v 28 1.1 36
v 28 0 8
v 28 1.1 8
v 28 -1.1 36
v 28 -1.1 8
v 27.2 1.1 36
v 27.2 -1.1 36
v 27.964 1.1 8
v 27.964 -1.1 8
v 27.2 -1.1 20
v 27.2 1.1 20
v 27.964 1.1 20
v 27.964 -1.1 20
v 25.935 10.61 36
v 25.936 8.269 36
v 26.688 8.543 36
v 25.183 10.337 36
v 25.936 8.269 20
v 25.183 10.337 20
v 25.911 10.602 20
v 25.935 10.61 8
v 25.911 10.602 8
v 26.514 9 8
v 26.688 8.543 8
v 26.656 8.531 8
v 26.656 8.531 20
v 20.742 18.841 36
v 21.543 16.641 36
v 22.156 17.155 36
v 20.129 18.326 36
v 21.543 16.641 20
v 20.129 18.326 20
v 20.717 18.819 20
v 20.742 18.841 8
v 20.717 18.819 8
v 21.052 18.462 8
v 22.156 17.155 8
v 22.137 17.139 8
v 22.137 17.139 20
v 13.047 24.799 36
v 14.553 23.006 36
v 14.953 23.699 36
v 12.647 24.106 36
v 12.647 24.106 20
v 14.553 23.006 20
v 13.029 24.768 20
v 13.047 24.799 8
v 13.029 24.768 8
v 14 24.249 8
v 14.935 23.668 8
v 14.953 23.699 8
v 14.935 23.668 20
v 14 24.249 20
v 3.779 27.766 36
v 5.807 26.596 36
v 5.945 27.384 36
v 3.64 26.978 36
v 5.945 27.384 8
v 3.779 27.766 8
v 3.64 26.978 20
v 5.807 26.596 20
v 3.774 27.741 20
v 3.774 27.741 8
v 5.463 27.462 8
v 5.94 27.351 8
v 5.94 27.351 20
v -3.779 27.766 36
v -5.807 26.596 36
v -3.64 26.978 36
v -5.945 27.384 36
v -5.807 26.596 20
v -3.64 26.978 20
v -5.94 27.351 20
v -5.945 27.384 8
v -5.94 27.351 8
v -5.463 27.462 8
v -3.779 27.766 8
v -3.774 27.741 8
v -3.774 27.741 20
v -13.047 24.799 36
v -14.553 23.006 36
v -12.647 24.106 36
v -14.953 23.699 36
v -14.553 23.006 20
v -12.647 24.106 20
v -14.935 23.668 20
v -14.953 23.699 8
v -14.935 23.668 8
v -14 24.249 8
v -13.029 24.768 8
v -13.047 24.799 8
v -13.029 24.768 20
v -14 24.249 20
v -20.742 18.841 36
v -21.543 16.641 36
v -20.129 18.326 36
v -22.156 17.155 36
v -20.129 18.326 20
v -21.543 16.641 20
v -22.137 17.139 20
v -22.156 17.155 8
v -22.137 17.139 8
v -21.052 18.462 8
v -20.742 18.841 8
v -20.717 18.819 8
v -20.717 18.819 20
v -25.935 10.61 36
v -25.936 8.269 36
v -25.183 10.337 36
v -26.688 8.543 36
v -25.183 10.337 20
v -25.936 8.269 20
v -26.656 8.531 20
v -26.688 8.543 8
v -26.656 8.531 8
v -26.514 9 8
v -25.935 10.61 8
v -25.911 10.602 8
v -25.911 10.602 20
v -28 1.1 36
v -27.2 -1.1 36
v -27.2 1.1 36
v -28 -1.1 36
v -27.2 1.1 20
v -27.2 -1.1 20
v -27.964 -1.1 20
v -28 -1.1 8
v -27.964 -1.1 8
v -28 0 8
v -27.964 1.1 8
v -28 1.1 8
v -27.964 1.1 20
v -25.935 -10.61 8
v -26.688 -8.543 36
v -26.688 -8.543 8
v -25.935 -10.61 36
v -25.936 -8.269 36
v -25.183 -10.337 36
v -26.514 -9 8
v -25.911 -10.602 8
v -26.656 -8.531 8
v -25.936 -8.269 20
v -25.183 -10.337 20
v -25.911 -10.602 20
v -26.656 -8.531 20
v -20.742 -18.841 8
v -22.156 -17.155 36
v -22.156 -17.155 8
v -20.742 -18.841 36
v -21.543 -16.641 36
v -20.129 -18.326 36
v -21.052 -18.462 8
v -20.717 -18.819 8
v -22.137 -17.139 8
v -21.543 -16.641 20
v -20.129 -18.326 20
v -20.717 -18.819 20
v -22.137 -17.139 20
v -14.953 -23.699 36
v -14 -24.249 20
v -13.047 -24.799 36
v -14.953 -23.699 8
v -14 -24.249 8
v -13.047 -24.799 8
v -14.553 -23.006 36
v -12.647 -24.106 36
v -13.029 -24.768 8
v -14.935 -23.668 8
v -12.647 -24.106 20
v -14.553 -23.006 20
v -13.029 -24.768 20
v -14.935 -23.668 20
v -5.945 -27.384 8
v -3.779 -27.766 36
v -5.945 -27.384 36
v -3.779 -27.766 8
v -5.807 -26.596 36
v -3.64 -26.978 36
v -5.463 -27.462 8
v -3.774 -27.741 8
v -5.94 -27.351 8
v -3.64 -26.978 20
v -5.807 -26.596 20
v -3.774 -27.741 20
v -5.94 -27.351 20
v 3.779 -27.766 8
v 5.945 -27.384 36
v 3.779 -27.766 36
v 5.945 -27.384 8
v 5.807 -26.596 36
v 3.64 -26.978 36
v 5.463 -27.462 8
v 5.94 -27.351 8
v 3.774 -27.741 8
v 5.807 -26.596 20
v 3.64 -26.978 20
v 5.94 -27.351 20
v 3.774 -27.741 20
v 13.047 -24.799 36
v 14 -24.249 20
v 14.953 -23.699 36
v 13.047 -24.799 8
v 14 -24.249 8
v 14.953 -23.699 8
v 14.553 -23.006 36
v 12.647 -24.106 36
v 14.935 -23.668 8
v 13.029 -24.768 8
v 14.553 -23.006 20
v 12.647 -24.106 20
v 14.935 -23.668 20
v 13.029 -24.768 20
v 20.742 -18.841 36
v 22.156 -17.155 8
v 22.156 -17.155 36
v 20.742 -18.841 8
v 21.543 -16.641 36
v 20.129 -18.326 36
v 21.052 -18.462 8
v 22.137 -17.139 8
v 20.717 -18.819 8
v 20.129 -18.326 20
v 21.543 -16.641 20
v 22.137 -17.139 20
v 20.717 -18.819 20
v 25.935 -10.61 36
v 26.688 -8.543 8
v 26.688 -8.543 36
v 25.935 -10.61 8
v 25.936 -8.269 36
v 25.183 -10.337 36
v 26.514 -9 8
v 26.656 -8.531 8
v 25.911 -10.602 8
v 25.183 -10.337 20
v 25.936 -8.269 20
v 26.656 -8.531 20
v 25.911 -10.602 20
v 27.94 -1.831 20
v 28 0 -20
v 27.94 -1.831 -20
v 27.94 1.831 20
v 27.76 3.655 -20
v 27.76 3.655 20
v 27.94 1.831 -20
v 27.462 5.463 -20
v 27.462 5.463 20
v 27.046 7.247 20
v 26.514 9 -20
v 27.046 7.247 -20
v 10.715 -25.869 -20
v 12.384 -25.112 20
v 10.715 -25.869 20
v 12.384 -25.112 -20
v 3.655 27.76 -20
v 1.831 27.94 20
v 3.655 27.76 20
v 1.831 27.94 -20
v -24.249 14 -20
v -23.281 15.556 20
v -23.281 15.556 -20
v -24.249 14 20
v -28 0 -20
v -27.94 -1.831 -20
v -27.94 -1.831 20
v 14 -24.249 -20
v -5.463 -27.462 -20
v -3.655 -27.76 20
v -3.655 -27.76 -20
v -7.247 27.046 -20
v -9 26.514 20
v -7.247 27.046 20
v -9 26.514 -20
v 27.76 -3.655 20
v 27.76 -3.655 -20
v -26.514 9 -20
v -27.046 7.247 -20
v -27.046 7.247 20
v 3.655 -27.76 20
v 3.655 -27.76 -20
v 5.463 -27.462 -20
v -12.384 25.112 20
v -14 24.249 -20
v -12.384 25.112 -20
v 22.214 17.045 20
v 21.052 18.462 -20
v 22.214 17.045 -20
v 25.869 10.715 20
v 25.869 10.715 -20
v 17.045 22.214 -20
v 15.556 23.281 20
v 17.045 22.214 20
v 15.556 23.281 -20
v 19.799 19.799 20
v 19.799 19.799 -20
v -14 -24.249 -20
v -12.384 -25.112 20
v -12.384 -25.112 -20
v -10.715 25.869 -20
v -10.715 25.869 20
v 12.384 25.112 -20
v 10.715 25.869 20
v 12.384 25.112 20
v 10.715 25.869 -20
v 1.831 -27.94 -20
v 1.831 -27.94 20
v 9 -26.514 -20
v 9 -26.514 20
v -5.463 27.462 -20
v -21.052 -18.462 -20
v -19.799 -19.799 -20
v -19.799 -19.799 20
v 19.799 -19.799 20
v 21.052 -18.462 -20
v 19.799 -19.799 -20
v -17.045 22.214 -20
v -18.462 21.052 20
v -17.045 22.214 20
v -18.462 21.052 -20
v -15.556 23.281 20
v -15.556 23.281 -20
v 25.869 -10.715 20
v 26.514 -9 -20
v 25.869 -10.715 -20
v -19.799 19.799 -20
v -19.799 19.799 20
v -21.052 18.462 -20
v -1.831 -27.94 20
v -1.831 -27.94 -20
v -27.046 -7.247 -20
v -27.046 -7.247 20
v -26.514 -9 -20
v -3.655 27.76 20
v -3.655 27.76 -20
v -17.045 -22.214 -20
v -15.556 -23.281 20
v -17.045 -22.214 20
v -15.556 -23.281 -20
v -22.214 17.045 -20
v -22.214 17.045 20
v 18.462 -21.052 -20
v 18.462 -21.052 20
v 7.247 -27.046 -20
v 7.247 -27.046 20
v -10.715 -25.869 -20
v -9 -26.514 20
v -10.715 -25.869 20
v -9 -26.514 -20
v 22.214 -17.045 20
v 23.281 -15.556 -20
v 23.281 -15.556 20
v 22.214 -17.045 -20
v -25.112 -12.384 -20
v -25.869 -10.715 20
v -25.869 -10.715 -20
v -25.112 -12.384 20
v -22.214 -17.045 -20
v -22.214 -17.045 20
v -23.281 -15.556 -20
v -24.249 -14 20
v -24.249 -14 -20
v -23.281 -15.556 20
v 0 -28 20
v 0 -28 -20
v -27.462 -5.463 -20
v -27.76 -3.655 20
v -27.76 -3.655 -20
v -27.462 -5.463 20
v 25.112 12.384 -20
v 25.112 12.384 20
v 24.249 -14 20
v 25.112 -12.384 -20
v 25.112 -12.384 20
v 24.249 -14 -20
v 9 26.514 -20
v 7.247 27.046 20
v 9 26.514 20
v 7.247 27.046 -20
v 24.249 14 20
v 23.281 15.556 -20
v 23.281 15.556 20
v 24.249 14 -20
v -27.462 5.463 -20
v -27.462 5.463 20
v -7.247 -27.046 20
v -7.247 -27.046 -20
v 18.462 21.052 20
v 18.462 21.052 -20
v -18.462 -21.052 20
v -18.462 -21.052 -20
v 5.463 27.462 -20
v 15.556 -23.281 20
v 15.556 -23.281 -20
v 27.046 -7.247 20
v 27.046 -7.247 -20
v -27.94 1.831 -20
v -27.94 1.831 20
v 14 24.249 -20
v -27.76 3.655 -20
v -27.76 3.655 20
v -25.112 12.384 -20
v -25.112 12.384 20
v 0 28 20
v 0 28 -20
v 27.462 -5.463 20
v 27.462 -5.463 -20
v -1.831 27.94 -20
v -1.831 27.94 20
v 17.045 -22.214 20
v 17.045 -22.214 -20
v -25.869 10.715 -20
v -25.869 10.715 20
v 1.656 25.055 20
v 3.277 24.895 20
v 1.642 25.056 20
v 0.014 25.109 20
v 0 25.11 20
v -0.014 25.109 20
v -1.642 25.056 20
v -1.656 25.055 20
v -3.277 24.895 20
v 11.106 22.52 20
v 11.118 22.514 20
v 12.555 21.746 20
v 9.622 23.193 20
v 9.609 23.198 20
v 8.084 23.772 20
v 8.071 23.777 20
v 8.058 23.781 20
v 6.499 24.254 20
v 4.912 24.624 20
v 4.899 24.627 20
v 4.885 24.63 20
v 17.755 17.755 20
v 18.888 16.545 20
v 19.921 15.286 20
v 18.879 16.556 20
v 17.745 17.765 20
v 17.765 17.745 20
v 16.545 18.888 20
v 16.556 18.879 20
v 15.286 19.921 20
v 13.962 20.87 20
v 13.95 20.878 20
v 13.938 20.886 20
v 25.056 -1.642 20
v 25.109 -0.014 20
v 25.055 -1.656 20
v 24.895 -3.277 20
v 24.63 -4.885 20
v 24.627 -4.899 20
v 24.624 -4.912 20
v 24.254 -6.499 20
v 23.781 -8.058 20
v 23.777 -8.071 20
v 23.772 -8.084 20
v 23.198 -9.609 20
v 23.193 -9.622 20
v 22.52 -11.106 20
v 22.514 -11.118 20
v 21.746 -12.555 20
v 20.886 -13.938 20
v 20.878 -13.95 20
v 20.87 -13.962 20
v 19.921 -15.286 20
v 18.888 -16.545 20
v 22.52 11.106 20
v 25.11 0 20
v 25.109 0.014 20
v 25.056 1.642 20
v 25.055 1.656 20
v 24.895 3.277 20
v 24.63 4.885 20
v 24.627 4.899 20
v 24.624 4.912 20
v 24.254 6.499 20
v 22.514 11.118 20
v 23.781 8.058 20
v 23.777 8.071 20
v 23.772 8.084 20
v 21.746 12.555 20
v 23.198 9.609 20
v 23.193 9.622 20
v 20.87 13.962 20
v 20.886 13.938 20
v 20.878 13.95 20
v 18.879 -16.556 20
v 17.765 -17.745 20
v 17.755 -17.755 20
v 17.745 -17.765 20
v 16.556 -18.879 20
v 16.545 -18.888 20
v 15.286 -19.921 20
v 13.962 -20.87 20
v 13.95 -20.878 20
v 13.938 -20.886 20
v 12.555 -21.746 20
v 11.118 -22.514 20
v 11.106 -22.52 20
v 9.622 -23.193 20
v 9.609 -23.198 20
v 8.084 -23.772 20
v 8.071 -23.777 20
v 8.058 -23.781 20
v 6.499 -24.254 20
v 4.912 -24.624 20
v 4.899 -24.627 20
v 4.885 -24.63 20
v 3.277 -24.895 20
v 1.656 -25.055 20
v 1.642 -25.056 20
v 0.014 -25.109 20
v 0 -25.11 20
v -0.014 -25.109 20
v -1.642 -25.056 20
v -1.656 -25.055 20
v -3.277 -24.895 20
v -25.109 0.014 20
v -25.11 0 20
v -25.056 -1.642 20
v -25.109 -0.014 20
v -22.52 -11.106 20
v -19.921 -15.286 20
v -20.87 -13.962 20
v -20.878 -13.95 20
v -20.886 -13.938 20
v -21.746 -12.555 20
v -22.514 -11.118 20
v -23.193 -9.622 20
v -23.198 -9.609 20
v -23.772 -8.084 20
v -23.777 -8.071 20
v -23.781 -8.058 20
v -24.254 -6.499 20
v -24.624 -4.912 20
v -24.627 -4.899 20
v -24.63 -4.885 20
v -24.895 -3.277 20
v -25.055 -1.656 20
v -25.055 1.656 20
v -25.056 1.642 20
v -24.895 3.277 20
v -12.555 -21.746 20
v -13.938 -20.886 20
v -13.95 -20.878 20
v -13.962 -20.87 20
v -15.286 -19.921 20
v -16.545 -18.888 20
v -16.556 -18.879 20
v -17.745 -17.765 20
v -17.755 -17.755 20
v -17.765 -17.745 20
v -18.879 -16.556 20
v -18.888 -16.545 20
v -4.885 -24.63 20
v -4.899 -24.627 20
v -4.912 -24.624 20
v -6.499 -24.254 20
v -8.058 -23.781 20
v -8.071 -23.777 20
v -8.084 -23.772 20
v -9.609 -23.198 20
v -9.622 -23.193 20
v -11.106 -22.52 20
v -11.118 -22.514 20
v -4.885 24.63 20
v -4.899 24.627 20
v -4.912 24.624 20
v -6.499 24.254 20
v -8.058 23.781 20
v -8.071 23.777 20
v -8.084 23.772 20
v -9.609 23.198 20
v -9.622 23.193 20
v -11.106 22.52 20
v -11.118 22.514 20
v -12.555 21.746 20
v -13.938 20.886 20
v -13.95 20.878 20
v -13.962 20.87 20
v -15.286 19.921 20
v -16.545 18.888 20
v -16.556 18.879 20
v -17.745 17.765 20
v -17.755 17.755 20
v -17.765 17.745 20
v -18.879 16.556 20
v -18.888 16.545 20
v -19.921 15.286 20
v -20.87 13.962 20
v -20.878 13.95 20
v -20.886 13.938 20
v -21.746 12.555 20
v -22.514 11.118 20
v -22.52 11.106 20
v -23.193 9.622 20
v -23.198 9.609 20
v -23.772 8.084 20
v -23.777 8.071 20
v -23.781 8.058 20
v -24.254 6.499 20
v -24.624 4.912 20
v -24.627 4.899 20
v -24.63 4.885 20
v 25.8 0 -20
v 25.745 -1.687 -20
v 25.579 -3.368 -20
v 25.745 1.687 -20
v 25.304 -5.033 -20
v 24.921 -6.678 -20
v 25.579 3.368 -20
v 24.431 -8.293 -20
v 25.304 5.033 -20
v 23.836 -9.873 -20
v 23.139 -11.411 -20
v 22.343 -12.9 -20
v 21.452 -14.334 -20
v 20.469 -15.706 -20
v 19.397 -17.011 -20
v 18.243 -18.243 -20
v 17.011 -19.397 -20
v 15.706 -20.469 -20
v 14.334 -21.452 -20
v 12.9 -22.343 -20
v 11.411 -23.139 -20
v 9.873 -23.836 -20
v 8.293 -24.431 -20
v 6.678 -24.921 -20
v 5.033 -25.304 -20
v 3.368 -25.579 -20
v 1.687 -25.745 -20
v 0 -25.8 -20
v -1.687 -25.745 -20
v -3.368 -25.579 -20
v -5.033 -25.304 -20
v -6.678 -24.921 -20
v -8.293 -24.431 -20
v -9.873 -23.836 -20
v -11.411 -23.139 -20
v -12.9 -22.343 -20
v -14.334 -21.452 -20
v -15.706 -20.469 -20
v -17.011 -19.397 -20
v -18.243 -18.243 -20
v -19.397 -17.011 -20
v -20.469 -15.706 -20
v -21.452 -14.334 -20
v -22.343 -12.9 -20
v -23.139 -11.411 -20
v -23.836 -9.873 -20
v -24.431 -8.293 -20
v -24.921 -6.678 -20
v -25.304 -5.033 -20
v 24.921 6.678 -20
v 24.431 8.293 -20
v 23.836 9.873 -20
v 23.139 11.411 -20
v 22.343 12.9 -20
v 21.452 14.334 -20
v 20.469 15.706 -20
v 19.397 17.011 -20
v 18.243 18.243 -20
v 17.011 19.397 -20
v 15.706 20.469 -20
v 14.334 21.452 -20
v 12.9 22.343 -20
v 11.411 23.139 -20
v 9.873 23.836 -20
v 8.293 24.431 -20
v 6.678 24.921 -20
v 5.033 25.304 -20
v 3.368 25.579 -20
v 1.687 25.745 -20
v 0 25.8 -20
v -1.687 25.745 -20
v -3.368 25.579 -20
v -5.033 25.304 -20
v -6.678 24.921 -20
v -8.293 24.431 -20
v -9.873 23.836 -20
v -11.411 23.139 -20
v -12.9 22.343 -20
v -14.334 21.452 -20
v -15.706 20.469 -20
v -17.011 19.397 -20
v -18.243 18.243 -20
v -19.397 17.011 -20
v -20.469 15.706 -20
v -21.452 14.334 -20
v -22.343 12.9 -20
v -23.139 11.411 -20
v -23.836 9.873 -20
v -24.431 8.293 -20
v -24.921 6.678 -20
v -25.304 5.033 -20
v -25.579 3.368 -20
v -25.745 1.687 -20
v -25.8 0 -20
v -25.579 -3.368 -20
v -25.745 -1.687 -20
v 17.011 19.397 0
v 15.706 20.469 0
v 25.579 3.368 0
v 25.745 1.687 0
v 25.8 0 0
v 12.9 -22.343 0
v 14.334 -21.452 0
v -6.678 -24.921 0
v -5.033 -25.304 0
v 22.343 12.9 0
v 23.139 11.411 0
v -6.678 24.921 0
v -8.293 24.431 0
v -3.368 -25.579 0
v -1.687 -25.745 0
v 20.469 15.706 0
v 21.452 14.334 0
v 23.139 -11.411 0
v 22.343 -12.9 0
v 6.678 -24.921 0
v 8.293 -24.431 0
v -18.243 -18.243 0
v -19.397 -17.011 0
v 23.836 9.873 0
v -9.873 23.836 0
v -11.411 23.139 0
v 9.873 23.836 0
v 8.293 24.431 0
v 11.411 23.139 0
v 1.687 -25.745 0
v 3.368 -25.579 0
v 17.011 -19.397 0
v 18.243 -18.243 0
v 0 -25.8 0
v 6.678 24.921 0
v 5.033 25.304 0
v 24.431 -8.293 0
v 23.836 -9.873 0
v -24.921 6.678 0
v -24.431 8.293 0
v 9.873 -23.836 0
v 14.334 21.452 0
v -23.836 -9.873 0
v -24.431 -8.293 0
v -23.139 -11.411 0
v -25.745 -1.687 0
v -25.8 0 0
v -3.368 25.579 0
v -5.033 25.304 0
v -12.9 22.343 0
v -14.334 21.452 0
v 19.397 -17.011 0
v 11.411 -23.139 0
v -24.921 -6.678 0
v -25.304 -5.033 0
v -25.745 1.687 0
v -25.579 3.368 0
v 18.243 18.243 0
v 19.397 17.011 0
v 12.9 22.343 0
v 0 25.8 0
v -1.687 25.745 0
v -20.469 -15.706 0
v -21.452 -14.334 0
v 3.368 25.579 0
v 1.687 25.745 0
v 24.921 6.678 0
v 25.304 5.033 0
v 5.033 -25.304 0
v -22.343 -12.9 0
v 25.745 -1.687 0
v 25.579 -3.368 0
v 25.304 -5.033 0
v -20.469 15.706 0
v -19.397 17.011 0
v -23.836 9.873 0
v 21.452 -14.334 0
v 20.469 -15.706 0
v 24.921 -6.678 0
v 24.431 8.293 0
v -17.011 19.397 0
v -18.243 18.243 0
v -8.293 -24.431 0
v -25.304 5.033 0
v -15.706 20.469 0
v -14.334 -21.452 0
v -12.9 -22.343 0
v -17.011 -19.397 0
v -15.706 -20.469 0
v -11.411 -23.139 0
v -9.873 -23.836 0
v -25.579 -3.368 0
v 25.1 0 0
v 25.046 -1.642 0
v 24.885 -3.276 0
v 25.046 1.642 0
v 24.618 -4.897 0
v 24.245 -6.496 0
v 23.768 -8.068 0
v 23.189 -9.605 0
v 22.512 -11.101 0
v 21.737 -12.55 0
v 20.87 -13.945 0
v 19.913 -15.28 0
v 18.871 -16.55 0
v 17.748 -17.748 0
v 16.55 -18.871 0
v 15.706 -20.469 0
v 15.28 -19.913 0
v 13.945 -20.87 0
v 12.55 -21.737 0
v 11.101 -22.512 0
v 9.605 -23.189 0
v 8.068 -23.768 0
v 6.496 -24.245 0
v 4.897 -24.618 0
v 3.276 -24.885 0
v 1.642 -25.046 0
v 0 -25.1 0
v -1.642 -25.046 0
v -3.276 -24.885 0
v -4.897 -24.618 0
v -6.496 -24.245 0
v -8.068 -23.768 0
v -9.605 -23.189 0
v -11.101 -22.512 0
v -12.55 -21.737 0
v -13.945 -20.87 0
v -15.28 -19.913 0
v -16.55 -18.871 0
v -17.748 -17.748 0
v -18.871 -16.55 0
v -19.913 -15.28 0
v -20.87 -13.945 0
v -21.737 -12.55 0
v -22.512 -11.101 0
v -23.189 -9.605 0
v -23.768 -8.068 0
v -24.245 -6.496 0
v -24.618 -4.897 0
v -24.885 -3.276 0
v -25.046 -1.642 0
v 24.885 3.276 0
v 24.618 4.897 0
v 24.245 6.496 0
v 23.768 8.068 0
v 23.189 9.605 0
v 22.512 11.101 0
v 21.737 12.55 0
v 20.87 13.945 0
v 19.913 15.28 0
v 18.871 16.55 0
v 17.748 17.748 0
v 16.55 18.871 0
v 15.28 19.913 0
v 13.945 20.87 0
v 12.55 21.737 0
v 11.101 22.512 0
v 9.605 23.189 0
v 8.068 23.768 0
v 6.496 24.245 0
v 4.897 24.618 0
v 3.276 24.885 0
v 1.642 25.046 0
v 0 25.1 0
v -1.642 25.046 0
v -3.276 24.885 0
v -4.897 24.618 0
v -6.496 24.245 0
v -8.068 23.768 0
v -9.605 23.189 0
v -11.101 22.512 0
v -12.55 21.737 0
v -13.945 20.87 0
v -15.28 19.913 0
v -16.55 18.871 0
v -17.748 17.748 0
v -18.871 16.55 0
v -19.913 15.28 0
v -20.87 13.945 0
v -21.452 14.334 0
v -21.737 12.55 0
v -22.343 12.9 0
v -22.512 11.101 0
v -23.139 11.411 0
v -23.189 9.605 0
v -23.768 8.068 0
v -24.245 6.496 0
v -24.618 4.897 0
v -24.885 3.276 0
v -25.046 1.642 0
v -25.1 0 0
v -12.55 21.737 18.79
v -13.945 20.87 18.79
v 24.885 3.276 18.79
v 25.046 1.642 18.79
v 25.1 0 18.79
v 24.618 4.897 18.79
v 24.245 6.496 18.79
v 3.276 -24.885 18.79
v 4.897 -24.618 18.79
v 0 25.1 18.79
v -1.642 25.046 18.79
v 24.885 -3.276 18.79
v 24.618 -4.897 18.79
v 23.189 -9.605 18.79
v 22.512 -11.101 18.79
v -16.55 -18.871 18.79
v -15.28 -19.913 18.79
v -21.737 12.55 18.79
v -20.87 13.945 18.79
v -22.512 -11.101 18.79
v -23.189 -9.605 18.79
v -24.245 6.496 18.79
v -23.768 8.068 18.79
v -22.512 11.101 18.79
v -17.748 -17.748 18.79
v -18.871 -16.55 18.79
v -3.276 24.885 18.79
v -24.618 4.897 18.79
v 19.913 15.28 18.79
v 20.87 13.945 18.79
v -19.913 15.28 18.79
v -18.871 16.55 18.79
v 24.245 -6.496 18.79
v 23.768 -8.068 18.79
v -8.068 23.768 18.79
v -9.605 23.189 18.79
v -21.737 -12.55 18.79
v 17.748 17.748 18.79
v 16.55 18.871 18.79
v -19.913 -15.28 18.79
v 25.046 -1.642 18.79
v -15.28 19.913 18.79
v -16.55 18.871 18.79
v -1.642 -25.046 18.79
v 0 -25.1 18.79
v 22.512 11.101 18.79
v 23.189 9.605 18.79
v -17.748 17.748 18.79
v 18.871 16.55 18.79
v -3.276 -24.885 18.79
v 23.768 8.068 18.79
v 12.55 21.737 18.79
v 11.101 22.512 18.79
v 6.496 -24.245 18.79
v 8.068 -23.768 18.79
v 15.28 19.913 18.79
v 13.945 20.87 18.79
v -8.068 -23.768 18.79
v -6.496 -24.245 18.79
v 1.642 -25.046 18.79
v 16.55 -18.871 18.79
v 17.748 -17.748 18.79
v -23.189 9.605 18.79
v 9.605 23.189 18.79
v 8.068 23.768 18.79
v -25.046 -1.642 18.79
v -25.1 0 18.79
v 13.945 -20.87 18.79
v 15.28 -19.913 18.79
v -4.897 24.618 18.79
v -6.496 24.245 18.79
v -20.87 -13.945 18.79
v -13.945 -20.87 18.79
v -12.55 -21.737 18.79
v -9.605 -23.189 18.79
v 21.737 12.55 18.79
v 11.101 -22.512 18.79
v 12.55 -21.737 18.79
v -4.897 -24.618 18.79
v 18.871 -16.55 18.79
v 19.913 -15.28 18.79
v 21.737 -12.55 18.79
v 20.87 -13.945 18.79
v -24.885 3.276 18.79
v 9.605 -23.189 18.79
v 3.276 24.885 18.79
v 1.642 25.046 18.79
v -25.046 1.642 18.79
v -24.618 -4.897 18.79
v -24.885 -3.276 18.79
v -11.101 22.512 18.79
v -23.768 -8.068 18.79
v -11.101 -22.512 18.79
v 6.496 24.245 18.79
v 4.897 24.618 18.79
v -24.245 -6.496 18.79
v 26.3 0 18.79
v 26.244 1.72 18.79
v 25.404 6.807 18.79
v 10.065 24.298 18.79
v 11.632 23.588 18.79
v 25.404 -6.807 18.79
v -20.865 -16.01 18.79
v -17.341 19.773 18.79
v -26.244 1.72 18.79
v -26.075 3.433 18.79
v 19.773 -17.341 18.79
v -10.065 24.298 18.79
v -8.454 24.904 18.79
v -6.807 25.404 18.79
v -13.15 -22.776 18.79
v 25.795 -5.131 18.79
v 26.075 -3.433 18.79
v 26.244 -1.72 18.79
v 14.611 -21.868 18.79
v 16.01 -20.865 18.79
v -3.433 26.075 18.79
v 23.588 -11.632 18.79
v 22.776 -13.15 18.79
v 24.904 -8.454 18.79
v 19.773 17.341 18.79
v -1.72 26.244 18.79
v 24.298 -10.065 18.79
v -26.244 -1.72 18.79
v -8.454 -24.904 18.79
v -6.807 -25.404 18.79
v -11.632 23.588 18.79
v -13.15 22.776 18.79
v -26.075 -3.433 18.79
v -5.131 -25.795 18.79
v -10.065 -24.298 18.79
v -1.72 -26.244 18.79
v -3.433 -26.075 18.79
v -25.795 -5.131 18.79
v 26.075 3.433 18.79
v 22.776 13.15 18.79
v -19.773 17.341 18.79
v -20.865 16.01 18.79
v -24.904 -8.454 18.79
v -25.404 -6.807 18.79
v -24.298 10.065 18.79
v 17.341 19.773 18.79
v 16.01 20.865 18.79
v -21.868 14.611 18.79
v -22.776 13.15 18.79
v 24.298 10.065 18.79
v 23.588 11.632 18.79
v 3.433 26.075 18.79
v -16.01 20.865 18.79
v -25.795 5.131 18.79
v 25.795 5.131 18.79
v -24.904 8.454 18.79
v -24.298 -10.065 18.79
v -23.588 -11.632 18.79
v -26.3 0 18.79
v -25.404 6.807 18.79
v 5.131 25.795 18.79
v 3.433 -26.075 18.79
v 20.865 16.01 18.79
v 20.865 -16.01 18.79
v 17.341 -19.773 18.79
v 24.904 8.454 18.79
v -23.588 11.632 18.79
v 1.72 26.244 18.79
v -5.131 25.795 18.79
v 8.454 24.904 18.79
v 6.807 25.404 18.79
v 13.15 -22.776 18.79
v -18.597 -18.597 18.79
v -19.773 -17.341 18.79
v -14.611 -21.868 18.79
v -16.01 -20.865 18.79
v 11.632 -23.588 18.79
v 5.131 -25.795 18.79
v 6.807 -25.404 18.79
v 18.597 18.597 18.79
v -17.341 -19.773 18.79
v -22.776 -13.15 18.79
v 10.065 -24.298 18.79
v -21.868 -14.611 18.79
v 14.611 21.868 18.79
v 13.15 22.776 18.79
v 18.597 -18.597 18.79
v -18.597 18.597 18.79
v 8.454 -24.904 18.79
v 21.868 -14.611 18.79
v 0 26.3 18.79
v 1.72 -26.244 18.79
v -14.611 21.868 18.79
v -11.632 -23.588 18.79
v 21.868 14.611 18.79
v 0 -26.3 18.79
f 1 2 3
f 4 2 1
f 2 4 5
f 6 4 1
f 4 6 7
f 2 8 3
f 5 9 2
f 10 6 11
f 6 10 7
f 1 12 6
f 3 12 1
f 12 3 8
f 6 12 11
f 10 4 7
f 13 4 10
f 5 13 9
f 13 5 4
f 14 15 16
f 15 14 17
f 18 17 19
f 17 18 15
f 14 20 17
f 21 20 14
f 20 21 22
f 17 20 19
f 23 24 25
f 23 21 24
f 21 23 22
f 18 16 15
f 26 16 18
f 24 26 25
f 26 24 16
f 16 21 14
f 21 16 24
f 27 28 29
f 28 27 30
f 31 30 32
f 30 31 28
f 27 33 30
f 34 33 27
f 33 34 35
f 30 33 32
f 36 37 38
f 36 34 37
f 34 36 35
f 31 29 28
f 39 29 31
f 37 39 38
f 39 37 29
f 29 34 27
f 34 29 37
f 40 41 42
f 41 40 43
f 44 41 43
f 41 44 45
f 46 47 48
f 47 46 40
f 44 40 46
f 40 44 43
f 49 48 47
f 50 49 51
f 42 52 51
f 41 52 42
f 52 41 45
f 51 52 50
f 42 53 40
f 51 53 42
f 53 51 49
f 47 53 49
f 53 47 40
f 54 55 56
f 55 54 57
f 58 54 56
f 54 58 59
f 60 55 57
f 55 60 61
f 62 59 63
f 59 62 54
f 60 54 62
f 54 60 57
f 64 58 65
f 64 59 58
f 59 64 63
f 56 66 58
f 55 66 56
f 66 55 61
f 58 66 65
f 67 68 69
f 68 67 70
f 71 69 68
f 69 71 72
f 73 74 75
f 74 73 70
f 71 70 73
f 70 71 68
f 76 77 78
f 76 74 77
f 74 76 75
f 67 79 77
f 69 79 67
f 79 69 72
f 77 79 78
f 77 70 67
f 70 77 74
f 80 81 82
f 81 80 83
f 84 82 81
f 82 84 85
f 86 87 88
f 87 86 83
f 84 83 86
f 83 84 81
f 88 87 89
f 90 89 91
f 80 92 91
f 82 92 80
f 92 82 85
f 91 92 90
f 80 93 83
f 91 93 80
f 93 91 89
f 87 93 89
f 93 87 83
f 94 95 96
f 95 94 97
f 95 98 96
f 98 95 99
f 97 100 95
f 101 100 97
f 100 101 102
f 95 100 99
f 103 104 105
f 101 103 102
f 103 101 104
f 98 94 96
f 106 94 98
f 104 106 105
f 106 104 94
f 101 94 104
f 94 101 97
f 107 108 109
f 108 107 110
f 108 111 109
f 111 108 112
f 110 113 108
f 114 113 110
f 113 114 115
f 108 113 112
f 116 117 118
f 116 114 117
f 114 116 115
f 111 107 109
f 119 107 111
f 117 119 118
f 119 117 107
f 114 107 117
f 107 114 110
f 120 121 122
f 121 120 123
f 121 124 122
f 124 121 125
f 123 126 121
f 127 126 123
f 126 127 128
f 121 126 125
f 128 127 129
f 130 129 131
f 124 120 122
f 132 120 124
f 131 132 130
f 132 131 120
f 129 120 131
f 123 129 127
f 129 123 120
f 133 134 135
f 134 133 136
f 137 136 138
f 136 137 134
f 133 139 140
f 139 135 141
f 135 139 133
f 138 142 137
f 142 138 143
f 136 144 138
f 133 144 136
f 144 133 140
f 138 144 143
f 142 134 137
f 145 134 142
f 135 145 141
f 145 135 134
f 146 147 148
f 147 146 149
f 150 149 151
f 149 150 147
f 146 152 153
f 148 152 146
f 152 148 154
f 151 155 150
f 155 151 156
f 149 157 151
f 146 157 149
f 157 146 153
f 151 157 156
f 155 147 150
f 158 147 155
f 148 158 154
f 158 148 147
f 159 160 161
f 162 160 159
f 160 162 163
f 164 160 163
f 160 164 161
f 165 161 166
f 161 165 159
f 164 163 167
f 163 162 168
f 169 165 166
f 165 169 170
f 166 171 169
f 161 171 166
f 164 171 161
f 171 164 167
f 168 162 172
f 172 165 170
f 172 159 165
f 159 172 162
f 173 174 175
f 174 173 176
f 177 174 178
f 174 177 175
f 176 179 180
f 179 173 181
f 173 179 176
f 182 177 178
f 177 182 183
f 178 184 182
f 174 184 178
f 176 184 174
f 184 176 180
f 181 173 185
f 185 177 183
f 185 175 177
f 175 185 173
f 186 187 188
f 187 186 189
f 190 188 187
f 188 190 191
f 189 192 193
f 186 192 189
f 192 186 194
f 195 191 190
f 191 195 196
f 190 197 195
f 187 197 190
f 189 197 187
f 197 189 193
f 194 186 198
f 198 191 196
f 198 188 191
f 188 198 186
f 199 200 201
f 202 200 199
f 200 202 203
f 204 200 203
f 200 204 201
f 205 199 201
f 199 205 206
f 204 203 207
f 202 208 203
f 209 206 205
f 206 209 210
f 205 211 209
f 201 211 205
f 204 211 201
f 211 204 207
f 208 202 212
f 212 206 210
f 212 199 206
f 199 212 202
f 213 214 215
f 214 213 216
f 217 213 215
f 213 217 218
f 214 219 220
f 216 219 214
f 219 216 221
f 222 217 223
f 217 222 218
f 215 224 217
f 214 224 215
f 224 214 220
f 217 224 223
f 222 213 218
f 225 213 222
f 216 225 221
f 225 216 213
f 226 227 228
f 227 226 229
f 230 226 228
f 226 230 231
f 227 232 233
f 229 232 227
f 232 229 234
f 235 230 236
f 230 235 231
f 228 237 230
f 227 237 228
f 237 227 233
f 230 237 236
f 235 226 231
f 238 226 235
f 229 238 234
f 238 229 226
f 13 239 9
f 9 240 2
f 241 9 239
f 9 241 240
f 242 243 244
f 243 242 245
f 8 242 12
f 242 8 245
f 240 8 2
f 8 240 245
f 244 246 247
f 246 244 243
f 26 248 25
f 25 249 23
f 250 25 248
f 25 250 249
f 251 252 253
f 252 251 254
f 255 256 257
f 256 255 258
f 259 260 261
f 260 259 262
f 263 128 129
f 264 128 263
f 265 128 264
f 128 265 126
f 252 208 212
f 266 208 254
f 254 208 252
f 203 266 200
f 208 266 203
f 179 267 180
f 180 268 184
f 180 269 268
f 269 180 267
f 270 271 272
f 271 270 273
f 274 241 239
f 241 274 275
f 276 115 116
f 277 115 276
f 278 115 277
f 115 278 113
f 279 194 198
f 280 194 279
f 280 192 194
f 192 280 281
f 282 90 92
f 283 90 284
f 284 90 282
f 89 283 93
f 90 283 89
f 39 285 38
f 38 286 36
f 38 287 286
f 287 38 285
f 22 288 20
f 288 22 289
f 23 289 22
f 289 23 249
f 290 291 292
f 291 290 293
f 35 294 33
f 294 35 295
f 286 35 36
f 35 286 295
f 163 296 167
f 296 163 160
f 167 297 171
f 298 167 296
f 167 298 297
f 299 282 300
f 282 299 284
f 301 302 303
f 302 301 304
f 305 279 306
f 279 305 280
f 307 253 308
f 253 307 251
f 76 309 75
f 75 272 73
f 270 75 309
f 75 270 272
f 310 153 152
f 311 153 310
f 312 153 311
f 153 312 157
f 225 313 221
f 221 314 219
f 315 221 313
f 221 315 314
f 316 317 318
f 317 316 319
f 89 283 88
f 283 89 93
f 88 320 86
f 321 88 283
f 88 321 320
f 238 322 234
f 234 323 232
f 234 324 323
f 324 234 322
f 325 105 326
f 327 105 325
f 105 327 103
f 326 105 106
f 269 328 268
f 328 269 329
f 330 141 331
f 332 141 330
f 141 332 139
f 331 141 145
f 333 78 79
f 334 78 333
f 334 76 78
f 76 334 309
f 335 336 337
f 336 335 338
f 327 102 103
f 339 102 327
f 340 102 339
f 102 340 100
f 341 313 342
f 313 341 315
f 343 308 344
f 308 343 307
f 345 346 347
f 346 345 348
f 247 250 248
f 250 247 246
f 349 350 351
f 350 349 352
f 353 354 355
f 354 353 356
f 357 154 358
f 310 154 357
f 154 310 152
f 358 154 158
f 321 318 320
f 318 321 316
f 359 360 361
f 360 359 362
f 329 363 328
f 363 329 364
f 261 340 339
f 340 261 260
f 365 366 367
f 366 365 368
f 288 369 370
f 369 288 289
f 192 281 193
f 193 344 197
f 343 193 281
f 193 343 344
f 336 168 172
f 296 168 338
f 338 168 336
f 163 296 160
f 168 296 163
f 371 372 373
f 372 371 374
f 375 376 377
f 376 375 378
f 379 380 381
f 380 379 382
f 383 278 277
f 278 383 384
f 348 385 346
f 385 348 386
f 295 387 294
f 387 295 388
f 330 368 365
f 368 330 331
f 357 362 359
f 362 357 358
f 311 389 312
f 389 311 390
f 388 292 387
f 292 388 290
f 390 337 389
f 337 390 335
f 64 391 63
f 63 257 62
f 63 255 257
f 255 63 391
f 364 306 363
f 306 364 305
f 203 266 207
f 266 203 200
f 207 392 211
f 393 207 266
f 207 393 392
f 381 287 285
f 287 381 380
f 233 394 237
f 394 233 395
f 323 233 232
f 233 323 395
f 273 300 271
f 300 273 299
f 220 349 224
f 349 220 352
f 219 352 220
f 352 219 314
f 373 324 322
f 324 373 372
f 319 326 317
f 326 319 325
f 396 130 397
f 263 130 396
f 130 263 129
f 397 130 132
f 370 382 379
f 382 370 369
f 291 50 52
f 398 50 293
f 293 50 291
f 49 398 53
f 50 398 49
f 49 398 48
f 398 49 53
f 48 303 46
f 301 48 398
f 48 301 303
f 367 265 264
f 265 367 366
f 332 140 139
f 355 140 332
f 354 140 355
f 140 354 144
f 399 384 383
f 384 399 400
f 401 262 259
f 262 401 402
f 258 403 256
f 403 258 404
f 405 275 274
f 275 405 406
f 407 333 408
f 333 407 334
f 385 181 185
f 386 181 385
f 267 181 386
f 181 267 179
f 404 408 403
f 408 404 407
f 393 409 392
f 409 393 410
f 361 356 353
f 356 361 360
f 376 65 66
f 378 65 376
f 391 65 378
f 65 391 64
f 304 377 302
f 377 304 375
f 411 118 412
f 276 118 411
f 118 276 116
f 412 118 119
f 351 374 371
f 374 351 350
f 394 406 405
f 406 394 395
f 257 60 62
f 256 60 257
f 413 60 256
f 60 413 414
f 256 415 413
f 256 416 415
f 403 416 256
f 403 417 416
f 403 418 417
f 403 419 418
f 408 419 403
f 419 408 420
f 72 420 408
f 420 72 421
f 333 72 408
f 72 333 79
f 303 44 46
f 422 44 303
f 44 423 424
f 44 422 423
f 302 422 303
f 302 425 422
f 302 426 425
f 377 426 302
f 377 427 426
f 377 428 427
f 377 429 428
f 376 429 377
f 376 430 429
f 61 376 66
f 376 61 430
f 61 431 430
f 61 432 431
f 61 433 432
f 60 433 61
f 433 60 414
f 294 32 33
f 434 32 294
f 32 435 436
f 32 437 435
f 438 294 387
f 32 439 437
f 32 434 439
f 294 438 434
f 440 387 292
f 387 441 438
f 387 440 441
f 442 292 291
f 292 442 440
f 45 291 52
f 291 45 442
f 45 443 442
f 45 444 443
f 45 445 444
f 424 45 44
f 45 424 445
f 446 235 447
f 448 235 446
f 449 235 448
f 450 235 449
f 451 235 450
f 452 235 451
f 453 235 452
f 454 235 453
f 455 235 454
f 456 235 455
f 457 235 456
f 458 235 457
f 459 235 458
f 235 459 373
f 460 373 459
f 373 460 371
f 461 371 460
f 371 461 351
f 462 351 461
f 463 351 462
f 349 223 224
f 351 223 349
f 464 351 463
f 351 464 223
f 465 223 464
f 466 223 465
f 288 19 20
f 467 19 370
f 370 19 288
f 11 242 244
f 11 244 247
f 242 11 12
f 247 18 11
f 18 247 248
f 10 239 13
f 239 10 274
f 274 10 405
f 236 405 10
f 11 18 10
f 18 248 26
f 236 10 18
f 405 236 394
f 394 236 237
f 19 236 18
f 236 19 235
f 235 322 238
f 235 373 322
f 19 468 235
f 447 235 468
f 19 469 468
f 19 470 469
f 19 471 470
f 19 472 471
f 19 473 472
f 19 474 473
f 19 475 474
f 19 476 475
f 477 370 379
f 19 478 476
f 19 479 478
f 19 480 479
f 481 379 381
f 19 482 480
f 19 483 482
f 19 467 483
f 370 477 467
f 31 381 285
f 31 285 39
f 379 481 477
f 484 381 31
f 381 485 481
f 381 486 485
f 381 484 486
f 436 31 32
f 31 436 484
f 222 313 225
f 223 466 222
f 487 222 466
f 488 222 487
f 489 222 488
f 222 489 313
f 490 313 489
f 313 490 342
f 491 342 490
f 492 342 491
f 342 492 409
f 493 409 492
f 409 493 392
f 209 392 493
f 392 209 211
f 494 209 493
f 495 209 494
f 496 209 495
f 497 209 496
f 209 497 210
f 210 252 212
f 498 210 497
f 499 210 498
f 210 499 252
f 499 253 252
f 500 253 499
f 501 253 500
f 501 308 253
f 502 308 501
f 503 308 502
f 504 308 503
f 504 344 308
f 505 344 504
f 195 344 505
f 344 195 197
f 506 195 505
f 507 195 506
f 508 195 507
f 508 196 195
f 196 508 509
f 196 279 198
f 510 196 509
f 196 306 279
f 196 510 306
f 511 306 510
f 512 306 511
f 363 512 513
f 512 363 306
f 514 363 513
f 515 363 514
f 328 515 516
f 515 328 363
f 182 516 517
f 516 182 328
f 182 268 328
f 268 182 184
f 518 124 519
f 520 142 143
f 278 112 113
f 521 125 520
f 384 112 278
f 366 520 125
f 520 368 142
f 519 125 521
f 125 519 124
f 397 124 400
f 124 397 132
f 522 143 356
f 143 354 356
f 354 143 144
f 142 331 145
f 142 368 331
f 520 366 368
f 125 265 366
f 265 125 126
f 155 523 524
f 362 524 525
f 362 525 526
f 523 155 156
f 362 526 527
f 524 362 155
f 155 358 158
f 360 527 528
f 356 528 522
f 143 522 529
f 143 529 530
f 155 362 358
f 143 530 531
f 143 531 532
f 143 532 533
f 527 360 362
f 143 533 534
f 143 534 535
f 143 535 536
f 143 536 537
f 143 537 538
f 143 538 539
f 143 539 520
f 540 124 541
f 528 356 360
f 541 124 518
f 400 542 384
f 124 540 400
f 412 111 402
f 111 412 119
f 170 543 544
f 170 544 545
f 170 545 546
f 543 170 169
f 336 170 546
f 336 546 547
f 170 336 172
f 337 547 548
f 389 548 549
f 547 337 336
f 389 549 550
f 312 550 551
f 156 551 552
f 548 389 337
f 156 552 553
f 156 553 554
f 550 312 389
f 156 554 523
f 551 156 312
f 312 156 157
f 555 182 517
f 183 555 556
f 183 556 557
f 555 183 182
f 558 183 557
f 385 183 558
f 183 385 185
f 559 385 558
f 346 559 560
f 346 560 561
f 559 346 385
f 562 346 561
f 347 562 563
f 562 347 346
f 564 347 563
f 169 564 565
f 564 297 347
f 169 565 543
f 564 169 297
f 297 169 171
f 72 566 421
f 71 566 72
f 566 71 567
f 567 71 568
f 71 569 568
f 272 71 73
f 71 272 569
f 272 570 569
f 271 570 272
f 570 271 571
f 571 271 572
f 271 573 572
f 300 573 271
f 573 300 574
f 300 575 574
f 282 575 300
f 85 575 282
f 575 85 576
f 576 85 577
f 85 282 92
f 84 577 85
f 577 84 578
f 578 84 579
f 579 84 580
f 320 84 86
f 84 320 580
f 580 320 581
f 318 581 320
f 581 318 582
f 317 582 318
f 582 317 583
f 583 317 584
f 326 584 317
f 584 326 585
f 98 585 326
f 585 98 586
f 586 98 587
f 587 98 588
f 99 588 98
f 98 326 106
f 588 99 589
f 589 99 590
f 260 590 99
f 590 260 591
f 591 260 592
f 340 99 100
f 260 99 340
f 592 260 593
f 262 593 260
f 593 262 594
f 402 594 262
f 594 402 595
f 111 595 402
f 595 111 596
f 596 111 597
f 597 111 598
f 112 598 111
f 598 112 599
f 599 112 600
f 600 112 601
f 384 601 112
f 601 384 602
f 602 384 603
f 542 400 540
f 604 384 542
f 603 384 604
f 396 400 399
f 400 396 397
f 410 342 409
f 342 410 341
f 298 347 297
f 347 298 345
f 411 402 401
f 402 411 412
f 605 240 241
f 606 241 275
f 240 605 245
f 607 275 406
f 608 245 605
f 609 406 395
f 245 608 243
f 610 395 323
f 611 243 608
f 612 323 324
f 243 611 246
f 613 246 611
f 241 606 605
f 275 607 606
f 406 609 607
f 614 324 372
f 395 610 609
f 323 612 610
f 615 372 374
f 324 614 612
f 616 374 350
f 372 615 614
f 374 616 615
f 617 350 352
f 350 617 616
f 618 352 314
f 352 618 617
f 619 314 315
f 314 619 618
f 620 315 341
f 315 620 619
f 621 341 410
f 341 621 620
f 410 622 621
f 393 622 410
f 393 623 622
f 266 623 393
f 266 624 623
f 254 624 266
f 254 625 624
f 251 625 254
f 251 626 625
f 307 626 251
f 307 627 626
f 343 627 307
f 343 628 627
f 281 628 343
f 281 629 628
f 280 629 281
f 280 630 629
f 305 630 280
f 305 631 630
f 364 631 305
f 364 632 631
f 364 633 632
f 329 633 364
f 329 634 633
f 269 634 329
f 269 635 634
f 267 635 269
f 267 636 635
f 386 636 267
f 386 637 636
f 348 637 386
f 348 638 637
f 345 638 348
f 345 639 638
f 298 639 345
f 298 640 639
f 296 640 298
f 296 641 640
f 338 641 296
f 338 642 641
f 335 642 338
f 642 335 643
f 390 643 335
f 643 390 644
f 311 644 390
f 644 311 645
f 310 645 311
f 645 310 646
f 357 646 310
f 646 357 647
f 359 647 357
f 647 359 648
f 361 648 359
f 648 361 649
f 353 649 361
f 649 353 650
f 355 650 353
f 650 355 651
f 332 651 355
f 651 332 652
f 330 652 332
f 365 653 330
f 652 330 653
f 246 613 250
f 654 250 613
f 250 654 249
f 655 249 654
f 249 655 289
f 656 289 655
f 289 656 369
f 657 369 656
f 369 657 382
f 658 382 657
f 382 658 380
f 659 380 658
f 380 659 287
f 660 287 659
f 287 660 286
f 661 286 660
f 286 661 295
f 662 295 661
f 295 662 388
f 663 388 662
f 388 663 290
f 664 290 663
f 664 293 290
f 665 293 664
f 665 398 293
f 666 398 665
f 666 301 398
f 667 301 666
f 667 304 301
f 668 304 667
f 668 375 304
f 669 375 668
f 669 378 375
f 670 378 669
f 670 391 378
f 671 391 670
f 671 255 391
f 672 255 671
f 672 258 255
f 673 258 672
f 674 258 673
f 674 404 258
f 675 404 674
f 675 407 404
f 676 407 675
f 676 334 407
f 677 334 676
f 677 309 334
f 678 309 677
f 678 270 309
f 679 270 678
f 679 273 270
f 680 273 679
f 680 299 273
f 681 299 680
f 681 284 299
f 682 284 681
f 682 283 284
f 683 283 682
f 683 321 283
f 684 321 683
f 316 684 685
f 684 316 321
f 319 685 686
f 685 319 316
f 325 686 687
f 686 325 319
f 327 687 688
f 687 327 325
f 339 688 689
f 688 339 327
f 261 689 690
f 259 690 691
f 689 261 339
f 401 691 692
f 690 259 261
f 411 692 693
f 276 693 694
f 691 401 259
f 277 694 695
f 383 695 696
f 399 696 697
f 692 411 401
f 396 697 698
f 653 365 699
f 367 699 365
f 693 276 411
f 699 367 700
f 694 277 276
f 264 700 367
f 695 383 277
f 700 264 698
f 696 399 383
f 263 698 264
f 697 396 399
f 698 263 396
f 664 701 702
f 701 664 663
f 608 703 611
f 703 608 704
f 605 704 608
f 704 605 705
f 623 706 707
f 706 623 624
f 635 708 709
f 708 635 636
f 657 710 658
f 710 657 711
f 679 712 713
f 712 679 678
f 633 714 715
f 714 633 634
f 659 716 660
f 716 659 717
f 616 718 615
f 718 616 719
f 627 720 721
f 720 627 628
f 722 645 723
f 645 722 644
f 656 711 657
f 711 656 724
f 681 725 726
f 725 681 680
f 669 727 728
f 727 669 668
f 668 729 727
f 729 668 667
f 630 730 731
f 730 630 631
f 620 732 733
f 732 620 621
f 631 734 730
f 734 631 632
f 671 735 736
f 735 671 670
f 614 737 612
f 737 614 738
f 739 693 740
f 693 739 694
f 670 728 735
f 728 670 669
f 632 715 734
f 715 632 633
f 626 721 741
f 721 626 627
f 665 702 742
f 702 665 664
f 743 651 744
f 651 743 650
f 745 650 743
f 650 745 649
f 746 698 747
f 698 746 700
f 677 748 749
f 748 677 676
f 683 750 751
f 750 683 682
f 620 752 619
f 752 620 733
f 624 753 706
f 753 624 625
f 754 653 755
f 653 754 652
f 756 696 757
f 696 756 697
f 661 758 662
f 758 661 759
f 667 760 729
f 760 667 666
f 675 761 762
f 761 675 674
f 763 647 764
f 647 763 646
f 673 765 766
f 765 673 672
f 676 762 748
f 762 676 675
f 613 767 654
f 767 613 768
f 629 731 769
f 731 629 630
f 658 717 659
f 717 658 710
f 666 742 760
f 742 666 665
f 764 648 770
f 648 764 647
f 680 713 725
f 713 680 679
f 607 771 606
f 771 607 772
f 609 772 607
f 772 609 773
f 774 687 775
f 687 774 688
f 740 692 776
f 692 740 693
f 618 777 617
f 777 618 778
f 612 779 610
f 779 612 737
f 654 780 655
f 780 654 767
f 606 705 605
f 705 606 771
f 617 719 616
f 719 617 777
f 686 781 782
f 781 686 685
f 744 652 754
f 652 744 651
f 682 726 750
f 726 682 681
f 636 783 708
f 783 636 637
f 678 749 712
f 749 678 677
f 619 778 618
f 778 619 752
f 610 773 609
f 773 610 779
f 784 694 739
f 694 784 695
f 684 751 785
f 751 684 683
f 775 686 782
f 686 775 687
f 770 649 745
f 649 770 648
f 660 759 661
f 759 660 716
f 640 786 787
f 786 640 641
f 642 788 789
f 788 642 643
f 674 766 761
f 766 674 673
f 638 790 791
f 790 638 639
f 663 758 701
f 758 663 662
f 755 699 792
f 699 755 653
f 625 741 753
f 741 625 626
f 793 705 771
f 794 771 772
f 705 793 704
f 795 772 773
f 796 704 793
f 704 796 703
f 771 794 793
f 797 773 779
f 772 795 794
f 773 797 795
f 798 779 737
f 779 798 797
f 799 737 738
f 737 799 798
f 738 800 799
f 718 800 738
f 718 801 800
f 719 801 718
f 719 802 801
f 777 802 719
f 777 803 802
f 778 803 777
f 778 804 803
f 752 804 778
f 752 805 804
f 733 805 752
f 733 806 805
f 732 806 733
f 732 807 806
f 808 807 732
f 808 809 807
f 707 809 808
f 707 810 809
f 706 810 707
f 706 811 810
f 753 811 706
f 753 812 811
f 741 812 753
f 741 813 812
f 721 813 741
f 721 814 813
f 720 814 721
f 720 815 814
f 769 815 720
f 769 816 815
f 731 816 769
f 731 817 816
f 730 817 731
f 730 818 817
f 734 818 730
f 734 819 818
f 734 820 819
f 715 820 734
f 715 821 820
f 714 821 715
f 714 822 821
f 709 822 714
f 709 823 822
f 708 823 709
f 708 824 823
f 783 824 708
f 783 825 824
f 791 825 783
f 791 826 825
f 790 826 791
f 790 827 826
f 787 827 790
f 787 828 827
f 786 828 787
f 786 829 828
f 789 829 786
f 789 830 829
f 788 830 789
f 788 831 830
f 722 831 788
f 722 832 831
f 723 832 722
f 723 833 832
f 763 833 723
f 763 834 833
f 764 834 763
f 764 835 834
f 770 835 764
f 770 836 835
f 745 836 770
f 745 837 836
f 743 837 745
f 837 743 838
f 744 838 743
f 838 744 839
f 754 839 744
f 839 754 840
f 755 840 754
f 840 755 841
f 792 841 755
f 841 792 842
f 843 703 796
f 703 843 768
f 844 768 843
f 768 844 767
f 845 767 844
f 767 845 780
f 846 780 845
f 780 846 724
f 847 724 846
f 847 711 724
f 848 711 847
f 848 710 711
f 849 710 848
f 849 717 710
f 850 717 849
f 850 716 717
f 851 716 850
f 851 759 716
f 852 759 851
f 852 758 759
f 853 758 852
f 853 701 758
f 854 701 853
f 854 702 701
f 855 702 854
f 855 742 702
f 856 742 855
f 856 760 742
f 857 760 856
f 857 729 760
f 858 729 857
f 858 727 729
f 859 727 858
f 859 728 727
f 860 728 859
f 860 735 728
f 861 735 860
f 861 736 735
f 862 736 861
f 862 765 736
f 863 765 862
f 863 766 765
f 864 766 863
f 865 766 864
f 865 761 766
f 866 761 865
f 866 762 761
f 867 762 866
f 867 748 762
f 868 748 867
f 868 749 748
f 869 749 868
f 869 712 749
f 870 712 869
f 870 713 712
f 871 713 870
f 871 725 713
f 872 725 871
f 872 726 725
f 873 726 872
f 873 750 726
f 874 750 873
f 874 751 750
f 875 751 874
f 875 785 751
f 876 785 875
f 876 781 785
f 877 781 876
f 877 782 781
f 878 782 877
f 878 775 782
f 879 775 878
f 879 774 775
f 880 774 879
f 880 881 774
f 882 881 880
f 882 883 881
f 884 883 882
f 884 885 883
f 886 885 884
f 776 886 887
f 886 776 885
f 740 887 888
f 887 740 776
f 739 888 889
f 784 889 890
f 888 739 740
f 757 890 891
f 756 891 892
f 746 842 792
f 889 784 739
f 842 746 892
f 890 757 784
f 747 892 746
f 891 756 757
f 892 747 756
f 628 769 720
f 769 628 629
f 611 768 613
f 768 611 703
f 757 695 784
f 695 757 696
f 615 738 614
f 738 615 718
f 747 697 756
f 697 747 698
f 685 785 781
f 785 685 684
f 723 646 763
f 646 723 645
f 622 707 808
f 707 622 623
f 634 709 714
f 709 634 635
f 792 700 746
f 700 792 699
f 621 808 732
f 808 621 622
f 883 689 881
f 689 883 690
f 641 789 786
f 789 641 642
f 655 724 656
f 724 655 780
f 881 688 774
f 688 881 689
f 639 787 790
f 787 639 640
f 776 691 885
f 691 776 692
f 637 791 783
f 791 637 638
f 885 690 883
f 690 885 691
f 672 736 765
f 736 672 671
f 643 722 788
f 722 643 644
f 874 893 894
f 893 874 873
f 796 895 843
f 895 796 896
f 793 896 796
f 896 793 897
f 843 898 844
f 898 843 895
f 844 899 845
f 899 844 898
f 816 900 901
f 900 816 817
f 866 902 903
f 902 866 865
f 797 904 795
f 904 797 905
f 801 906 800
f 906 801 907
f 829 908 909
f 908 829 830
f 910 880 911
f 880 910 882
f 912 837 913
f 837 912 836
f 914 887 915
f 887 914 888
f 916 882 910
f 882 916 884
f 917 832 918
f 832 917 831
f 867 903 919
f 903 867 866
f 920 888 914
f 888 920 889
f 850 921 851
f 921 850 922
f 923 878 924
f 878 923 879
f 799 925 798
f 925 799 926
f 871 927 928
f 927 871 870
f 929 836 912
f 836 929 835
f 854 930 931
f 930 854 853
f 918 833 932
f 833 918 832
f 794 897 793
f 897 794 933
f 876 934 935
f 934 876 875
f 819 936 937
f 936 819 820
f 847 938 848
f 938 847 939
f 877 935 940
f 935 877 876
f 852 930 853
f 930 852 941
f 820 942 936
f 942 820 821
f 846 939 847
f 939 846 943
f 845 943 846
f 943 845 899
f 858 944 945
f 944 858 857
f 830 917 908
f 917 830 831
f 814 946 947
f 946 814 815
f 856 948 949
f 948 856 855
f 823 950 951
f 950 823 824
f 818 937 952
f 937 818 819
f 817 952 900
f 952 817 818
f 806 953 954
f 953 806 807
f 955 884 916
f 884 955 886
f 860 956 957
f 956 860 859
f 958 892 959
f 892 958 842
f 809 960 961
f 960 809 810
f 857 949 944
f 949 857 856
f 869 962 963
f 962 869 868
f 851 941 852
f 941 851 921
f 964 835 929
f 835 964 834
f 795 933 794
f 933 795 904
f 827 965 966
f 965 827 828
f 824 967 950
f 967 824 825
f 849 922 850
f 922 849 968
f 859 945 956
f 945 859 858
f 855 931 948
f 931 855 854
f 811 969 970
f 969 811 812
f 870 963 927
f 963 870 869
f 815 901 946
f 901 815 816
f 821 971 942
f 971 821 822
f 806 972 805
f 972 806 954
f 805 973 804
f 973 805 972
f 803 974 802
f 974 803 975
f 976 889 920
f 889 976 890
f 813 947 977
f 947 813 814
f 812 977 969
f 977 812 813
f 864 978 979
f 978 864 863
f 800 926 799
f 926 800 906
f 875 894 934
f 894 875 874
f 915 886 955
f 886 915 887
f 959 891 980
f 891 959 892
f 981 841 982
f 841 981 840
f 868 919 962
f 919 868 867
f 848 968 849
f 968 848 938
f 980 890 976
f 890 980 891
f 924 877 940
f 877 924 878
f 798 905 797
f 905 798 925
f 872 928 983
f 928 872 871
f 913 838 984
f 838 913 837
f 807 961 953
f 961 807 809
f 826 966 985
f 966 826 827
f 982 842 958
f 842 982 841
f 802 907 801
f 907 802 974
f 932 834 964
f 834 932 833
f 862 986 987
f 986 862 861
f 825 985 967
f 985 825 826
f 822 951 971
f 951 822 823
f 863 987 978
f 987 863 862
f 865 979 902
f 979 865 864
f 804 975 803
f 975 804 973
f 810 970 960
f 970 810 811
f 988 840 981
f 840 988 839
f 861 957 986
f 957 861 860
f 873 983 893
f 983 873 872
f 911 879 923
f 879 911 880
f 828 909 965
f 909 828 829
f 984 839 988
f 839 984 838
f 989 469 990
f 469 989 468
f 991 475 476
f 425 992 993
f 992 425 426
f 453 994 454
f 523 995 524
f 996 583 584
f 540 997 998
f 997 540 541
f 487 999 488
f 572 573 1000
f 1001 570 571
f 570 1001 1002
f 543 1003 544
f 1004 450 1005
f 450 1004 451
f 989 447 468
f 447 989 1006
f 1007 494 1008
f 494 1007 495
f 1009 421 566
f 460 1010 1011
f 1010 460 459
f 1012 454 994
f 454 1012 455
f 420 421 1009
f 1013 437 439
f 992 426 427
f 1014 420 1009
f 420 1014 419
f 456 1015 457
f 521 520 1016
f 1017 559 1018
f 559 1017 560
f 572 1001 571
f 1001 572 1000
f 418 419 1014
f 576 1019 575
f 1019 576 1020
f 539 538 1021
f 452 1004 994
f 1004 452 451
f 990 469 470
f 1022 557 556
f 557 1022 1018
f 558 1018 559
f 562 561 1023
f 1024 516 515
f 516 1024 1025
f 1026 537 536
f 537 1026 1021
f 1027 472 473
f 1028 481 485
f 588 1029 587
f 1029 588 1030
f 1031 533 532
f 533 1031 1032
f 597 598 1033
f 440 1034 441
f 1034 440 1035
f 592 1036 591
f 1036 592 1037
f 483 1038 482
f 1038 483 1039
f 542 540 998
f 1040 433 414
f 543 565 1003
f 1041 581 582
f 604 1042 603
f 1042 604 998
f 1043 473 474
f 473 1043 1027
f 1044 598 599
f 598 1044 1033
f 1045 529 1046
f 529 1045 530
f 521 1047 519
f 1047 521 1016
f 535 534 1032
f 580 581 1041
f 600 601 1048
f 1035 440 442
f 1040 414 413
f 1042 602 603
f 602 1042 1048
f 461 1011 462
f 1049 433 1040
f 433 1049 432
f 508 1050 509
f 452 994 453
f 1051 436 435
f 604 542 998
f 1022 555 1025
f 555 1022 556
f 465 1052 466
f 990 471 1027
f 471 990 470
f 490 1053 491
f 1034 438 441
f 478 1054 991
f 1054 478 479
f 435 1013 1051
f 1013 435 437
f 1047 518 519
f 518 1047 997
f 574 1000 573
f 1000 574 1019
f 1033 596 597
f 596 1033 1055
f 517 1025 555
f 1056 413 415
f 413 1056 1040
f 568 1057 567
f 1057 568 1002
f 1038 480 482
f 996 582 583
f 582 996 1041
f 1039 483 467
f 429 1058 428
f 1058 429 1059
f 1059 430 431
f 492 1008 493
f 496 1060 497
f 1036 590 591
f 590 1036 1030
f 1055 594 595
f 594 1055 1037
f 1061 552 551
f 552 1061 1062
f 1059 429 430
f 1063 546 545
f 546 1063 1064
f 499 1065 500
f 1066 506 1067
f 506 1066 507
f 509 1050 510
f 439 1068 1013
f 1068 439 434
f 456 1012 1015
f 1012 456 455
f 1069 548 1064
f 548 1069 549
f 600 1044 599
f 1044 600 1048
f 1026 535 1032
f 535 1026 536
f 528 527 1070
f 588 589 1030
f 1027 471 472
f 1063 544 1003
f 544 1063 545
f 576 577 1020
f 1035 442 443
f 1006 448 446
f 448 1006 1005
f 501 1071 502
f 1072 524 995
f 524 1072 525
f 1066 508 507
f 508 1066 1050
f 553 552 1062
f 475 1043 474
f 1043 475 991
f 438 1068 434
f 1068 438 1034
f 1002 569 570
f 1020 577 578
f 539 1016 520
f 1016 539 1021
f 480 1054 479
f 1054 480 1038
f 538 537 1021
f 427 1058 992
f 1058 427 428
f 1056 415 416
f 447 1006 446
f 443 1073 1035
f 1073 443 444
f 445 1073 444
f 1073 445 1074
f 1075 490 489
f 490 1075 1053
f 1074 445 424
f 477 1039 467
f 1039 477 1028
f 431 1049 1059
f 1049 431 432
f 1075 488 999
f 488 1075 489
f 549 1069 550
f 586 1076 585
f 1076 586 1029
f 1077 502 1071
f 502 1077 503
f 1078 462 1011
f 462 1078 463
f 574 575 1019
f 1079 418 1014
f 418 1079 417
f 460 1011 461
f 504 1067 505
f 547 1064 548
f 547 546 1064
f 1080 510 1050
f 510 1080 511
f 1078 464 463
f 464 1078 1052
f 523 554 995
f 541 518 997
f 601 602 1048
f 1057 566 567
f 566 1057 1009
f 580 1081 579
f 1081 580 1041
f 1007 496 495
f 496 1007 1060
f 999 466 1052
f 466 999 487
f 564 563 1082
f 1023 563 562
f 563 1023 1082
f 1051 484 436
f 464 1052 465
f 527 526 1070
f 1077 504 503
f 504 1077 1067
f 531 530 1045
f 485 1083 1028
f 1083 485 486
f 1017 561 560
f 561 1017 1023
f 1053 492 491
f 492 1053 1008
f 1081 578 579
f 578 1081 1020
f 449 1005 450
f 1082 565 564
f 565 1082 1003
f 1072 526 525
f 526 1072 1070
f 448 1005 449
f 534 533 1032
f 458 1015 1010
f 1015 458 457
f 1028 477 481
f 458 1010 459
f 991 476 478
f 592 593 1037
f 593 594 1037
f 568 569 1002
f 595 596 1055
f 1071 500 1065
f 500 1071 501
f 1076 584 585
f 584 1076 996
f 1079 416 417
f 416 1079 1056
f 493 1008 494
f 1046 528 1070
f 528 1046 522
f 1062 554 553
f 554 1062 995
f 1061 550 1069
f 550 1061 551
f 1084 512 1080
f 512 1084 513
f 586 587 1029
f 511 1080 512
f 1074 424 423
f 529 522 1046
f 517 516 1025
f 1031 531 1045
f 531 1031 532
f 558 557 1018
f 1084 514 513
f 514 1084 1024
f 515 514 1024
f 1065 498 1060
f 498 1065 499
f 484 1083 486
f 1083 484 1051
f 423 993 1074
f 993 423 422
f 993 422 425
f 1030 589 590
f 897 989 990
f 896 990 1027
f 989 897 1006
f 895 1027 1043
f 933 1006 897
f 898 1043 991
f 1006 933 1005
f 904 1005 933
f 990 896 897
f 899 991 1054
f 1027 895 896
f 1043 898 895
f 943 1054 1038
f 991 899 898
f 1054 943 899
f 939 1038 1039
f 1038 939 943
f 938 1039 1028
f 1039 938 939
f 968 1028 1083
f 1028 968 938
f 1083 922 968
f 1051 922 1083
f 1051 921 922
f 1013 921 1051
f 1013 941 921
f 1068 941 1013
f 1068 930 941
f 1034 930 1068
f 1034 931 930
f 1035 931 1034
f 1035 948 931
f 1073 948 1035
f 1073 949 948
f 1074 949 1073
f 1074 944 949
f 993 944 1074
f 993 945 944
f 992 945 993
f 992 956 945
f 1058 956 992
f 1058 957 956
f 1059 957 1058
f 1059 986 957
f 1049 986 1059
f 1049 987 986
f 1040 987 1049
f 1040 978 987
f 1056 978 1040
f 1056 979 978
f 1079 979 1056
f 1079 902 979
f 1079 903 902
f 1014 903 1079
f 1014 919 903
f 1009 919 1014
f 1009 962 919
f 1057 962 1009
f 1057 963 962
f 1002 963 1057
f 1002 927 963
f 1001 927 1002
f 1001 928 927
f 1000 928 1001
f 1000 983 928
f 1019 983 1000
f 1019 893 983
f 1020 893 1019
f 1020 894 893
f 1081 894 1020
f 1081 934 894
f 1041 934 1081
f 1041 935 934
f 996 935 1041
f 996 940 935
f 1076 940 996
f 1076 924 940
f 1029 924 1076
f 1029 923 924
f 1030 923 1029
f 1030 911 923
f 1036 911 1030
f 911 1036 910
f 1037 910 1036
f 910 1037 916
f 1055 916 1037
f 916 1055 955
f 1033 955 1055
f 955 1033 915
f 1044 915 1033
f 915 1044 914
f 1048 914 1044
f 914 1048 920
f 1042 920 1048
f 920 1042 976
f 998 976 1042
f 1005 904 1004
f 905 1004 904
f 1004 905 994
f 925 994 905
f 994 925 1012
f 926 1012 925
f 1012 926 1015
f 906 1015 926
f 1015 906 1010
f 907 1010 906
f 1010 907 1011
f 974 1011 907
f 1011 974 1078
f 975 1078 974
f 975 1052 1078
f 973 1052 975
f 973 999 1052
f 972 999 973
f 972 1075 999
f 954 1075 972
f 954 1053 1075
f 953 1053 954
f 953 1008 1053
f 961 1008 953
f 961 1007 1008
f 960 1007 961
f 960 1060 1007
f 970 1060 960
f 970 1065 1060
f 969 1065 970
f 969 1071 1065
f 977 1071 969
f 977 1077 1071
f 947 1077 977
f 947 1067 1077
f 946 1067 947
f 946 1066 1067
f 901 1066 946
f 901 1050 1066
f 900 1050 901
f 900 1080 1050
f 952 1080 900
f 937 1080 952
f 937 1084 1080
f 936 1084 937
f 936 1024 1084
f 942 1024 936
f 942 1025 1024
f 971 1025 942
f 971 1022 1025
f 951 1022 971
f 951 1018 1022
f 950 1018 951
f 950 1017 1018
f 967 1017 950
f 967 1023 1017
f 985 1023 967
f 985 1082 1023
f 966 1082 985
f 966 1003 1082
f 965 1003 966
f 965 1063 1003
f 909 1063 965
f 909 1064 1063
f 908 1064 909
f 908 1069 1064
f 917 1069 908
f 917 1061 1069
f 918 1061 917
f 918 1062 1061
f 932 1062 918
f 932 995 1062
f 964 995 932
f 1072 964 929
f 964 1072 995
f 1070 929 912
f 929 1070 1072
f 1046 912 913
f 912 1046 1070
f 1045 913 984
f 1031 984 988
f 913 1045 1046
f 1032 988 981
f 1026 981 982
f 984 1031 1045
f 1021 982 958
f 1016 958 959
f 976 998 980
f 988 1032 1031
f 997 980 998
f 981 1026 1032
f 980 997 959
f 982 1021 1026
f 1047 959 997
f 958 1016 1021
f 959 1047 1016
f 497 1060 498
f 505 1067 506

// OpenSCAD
$fn=96;

module ht50_cap(
    od=56,          // outer diameter of cap body
    wall=2.2,       // wall thickness
    height=40,      // overall height
    top_th=3,       // top thickness
    socket_id=50.2, // inner diameter of socket (fits HT50 pipe OD)
    socket_depth=28,// insertion depth
    chamfer=1.2,    // lead-in chamfer
    grip_ribs=18,   // number of ribs
    rib_h=0.8,      // rib height
    rib_w=2.2       // rib width (tangential)
){
    id = od - 2*wall;
    outer_r = od/2;
    inner_r = id/2;

    module rib(){
        translate([outer_r - rib_h/2, 0, height*0.55])
            cube([rib_h, rib_w, height*0.7], center=true);
    }

    difference(){
        union(){
            cylinder(h=height, r=outer_r, center=true);

            // external grip ribs
            for(i=[0:grip_ribs-1]){
                rotate([0,0, i*360/grip_ribs]) rib();
            }
        }

        // main hollow (leaves top thickness)
        translate([0,0, -height/2 + top_th/2])
            cylinder(h=height-top_th, r=inner_r, center=true);

        // socket bore for pipe insertion
        translate([0,0, height/2 - socket_depth/2])
            cylinder(h=socket_depth+0.02, r=socket_id/2, center=true);

        // lead-in chamfer at opening
        translate([0,0, height/2 - chamfer/2])
            cylinder(h=chamfer+0.02, r1=socket_id/2 + chamfer, r2=socket_id/2, center=true);
    }
}

ht50_cap();
